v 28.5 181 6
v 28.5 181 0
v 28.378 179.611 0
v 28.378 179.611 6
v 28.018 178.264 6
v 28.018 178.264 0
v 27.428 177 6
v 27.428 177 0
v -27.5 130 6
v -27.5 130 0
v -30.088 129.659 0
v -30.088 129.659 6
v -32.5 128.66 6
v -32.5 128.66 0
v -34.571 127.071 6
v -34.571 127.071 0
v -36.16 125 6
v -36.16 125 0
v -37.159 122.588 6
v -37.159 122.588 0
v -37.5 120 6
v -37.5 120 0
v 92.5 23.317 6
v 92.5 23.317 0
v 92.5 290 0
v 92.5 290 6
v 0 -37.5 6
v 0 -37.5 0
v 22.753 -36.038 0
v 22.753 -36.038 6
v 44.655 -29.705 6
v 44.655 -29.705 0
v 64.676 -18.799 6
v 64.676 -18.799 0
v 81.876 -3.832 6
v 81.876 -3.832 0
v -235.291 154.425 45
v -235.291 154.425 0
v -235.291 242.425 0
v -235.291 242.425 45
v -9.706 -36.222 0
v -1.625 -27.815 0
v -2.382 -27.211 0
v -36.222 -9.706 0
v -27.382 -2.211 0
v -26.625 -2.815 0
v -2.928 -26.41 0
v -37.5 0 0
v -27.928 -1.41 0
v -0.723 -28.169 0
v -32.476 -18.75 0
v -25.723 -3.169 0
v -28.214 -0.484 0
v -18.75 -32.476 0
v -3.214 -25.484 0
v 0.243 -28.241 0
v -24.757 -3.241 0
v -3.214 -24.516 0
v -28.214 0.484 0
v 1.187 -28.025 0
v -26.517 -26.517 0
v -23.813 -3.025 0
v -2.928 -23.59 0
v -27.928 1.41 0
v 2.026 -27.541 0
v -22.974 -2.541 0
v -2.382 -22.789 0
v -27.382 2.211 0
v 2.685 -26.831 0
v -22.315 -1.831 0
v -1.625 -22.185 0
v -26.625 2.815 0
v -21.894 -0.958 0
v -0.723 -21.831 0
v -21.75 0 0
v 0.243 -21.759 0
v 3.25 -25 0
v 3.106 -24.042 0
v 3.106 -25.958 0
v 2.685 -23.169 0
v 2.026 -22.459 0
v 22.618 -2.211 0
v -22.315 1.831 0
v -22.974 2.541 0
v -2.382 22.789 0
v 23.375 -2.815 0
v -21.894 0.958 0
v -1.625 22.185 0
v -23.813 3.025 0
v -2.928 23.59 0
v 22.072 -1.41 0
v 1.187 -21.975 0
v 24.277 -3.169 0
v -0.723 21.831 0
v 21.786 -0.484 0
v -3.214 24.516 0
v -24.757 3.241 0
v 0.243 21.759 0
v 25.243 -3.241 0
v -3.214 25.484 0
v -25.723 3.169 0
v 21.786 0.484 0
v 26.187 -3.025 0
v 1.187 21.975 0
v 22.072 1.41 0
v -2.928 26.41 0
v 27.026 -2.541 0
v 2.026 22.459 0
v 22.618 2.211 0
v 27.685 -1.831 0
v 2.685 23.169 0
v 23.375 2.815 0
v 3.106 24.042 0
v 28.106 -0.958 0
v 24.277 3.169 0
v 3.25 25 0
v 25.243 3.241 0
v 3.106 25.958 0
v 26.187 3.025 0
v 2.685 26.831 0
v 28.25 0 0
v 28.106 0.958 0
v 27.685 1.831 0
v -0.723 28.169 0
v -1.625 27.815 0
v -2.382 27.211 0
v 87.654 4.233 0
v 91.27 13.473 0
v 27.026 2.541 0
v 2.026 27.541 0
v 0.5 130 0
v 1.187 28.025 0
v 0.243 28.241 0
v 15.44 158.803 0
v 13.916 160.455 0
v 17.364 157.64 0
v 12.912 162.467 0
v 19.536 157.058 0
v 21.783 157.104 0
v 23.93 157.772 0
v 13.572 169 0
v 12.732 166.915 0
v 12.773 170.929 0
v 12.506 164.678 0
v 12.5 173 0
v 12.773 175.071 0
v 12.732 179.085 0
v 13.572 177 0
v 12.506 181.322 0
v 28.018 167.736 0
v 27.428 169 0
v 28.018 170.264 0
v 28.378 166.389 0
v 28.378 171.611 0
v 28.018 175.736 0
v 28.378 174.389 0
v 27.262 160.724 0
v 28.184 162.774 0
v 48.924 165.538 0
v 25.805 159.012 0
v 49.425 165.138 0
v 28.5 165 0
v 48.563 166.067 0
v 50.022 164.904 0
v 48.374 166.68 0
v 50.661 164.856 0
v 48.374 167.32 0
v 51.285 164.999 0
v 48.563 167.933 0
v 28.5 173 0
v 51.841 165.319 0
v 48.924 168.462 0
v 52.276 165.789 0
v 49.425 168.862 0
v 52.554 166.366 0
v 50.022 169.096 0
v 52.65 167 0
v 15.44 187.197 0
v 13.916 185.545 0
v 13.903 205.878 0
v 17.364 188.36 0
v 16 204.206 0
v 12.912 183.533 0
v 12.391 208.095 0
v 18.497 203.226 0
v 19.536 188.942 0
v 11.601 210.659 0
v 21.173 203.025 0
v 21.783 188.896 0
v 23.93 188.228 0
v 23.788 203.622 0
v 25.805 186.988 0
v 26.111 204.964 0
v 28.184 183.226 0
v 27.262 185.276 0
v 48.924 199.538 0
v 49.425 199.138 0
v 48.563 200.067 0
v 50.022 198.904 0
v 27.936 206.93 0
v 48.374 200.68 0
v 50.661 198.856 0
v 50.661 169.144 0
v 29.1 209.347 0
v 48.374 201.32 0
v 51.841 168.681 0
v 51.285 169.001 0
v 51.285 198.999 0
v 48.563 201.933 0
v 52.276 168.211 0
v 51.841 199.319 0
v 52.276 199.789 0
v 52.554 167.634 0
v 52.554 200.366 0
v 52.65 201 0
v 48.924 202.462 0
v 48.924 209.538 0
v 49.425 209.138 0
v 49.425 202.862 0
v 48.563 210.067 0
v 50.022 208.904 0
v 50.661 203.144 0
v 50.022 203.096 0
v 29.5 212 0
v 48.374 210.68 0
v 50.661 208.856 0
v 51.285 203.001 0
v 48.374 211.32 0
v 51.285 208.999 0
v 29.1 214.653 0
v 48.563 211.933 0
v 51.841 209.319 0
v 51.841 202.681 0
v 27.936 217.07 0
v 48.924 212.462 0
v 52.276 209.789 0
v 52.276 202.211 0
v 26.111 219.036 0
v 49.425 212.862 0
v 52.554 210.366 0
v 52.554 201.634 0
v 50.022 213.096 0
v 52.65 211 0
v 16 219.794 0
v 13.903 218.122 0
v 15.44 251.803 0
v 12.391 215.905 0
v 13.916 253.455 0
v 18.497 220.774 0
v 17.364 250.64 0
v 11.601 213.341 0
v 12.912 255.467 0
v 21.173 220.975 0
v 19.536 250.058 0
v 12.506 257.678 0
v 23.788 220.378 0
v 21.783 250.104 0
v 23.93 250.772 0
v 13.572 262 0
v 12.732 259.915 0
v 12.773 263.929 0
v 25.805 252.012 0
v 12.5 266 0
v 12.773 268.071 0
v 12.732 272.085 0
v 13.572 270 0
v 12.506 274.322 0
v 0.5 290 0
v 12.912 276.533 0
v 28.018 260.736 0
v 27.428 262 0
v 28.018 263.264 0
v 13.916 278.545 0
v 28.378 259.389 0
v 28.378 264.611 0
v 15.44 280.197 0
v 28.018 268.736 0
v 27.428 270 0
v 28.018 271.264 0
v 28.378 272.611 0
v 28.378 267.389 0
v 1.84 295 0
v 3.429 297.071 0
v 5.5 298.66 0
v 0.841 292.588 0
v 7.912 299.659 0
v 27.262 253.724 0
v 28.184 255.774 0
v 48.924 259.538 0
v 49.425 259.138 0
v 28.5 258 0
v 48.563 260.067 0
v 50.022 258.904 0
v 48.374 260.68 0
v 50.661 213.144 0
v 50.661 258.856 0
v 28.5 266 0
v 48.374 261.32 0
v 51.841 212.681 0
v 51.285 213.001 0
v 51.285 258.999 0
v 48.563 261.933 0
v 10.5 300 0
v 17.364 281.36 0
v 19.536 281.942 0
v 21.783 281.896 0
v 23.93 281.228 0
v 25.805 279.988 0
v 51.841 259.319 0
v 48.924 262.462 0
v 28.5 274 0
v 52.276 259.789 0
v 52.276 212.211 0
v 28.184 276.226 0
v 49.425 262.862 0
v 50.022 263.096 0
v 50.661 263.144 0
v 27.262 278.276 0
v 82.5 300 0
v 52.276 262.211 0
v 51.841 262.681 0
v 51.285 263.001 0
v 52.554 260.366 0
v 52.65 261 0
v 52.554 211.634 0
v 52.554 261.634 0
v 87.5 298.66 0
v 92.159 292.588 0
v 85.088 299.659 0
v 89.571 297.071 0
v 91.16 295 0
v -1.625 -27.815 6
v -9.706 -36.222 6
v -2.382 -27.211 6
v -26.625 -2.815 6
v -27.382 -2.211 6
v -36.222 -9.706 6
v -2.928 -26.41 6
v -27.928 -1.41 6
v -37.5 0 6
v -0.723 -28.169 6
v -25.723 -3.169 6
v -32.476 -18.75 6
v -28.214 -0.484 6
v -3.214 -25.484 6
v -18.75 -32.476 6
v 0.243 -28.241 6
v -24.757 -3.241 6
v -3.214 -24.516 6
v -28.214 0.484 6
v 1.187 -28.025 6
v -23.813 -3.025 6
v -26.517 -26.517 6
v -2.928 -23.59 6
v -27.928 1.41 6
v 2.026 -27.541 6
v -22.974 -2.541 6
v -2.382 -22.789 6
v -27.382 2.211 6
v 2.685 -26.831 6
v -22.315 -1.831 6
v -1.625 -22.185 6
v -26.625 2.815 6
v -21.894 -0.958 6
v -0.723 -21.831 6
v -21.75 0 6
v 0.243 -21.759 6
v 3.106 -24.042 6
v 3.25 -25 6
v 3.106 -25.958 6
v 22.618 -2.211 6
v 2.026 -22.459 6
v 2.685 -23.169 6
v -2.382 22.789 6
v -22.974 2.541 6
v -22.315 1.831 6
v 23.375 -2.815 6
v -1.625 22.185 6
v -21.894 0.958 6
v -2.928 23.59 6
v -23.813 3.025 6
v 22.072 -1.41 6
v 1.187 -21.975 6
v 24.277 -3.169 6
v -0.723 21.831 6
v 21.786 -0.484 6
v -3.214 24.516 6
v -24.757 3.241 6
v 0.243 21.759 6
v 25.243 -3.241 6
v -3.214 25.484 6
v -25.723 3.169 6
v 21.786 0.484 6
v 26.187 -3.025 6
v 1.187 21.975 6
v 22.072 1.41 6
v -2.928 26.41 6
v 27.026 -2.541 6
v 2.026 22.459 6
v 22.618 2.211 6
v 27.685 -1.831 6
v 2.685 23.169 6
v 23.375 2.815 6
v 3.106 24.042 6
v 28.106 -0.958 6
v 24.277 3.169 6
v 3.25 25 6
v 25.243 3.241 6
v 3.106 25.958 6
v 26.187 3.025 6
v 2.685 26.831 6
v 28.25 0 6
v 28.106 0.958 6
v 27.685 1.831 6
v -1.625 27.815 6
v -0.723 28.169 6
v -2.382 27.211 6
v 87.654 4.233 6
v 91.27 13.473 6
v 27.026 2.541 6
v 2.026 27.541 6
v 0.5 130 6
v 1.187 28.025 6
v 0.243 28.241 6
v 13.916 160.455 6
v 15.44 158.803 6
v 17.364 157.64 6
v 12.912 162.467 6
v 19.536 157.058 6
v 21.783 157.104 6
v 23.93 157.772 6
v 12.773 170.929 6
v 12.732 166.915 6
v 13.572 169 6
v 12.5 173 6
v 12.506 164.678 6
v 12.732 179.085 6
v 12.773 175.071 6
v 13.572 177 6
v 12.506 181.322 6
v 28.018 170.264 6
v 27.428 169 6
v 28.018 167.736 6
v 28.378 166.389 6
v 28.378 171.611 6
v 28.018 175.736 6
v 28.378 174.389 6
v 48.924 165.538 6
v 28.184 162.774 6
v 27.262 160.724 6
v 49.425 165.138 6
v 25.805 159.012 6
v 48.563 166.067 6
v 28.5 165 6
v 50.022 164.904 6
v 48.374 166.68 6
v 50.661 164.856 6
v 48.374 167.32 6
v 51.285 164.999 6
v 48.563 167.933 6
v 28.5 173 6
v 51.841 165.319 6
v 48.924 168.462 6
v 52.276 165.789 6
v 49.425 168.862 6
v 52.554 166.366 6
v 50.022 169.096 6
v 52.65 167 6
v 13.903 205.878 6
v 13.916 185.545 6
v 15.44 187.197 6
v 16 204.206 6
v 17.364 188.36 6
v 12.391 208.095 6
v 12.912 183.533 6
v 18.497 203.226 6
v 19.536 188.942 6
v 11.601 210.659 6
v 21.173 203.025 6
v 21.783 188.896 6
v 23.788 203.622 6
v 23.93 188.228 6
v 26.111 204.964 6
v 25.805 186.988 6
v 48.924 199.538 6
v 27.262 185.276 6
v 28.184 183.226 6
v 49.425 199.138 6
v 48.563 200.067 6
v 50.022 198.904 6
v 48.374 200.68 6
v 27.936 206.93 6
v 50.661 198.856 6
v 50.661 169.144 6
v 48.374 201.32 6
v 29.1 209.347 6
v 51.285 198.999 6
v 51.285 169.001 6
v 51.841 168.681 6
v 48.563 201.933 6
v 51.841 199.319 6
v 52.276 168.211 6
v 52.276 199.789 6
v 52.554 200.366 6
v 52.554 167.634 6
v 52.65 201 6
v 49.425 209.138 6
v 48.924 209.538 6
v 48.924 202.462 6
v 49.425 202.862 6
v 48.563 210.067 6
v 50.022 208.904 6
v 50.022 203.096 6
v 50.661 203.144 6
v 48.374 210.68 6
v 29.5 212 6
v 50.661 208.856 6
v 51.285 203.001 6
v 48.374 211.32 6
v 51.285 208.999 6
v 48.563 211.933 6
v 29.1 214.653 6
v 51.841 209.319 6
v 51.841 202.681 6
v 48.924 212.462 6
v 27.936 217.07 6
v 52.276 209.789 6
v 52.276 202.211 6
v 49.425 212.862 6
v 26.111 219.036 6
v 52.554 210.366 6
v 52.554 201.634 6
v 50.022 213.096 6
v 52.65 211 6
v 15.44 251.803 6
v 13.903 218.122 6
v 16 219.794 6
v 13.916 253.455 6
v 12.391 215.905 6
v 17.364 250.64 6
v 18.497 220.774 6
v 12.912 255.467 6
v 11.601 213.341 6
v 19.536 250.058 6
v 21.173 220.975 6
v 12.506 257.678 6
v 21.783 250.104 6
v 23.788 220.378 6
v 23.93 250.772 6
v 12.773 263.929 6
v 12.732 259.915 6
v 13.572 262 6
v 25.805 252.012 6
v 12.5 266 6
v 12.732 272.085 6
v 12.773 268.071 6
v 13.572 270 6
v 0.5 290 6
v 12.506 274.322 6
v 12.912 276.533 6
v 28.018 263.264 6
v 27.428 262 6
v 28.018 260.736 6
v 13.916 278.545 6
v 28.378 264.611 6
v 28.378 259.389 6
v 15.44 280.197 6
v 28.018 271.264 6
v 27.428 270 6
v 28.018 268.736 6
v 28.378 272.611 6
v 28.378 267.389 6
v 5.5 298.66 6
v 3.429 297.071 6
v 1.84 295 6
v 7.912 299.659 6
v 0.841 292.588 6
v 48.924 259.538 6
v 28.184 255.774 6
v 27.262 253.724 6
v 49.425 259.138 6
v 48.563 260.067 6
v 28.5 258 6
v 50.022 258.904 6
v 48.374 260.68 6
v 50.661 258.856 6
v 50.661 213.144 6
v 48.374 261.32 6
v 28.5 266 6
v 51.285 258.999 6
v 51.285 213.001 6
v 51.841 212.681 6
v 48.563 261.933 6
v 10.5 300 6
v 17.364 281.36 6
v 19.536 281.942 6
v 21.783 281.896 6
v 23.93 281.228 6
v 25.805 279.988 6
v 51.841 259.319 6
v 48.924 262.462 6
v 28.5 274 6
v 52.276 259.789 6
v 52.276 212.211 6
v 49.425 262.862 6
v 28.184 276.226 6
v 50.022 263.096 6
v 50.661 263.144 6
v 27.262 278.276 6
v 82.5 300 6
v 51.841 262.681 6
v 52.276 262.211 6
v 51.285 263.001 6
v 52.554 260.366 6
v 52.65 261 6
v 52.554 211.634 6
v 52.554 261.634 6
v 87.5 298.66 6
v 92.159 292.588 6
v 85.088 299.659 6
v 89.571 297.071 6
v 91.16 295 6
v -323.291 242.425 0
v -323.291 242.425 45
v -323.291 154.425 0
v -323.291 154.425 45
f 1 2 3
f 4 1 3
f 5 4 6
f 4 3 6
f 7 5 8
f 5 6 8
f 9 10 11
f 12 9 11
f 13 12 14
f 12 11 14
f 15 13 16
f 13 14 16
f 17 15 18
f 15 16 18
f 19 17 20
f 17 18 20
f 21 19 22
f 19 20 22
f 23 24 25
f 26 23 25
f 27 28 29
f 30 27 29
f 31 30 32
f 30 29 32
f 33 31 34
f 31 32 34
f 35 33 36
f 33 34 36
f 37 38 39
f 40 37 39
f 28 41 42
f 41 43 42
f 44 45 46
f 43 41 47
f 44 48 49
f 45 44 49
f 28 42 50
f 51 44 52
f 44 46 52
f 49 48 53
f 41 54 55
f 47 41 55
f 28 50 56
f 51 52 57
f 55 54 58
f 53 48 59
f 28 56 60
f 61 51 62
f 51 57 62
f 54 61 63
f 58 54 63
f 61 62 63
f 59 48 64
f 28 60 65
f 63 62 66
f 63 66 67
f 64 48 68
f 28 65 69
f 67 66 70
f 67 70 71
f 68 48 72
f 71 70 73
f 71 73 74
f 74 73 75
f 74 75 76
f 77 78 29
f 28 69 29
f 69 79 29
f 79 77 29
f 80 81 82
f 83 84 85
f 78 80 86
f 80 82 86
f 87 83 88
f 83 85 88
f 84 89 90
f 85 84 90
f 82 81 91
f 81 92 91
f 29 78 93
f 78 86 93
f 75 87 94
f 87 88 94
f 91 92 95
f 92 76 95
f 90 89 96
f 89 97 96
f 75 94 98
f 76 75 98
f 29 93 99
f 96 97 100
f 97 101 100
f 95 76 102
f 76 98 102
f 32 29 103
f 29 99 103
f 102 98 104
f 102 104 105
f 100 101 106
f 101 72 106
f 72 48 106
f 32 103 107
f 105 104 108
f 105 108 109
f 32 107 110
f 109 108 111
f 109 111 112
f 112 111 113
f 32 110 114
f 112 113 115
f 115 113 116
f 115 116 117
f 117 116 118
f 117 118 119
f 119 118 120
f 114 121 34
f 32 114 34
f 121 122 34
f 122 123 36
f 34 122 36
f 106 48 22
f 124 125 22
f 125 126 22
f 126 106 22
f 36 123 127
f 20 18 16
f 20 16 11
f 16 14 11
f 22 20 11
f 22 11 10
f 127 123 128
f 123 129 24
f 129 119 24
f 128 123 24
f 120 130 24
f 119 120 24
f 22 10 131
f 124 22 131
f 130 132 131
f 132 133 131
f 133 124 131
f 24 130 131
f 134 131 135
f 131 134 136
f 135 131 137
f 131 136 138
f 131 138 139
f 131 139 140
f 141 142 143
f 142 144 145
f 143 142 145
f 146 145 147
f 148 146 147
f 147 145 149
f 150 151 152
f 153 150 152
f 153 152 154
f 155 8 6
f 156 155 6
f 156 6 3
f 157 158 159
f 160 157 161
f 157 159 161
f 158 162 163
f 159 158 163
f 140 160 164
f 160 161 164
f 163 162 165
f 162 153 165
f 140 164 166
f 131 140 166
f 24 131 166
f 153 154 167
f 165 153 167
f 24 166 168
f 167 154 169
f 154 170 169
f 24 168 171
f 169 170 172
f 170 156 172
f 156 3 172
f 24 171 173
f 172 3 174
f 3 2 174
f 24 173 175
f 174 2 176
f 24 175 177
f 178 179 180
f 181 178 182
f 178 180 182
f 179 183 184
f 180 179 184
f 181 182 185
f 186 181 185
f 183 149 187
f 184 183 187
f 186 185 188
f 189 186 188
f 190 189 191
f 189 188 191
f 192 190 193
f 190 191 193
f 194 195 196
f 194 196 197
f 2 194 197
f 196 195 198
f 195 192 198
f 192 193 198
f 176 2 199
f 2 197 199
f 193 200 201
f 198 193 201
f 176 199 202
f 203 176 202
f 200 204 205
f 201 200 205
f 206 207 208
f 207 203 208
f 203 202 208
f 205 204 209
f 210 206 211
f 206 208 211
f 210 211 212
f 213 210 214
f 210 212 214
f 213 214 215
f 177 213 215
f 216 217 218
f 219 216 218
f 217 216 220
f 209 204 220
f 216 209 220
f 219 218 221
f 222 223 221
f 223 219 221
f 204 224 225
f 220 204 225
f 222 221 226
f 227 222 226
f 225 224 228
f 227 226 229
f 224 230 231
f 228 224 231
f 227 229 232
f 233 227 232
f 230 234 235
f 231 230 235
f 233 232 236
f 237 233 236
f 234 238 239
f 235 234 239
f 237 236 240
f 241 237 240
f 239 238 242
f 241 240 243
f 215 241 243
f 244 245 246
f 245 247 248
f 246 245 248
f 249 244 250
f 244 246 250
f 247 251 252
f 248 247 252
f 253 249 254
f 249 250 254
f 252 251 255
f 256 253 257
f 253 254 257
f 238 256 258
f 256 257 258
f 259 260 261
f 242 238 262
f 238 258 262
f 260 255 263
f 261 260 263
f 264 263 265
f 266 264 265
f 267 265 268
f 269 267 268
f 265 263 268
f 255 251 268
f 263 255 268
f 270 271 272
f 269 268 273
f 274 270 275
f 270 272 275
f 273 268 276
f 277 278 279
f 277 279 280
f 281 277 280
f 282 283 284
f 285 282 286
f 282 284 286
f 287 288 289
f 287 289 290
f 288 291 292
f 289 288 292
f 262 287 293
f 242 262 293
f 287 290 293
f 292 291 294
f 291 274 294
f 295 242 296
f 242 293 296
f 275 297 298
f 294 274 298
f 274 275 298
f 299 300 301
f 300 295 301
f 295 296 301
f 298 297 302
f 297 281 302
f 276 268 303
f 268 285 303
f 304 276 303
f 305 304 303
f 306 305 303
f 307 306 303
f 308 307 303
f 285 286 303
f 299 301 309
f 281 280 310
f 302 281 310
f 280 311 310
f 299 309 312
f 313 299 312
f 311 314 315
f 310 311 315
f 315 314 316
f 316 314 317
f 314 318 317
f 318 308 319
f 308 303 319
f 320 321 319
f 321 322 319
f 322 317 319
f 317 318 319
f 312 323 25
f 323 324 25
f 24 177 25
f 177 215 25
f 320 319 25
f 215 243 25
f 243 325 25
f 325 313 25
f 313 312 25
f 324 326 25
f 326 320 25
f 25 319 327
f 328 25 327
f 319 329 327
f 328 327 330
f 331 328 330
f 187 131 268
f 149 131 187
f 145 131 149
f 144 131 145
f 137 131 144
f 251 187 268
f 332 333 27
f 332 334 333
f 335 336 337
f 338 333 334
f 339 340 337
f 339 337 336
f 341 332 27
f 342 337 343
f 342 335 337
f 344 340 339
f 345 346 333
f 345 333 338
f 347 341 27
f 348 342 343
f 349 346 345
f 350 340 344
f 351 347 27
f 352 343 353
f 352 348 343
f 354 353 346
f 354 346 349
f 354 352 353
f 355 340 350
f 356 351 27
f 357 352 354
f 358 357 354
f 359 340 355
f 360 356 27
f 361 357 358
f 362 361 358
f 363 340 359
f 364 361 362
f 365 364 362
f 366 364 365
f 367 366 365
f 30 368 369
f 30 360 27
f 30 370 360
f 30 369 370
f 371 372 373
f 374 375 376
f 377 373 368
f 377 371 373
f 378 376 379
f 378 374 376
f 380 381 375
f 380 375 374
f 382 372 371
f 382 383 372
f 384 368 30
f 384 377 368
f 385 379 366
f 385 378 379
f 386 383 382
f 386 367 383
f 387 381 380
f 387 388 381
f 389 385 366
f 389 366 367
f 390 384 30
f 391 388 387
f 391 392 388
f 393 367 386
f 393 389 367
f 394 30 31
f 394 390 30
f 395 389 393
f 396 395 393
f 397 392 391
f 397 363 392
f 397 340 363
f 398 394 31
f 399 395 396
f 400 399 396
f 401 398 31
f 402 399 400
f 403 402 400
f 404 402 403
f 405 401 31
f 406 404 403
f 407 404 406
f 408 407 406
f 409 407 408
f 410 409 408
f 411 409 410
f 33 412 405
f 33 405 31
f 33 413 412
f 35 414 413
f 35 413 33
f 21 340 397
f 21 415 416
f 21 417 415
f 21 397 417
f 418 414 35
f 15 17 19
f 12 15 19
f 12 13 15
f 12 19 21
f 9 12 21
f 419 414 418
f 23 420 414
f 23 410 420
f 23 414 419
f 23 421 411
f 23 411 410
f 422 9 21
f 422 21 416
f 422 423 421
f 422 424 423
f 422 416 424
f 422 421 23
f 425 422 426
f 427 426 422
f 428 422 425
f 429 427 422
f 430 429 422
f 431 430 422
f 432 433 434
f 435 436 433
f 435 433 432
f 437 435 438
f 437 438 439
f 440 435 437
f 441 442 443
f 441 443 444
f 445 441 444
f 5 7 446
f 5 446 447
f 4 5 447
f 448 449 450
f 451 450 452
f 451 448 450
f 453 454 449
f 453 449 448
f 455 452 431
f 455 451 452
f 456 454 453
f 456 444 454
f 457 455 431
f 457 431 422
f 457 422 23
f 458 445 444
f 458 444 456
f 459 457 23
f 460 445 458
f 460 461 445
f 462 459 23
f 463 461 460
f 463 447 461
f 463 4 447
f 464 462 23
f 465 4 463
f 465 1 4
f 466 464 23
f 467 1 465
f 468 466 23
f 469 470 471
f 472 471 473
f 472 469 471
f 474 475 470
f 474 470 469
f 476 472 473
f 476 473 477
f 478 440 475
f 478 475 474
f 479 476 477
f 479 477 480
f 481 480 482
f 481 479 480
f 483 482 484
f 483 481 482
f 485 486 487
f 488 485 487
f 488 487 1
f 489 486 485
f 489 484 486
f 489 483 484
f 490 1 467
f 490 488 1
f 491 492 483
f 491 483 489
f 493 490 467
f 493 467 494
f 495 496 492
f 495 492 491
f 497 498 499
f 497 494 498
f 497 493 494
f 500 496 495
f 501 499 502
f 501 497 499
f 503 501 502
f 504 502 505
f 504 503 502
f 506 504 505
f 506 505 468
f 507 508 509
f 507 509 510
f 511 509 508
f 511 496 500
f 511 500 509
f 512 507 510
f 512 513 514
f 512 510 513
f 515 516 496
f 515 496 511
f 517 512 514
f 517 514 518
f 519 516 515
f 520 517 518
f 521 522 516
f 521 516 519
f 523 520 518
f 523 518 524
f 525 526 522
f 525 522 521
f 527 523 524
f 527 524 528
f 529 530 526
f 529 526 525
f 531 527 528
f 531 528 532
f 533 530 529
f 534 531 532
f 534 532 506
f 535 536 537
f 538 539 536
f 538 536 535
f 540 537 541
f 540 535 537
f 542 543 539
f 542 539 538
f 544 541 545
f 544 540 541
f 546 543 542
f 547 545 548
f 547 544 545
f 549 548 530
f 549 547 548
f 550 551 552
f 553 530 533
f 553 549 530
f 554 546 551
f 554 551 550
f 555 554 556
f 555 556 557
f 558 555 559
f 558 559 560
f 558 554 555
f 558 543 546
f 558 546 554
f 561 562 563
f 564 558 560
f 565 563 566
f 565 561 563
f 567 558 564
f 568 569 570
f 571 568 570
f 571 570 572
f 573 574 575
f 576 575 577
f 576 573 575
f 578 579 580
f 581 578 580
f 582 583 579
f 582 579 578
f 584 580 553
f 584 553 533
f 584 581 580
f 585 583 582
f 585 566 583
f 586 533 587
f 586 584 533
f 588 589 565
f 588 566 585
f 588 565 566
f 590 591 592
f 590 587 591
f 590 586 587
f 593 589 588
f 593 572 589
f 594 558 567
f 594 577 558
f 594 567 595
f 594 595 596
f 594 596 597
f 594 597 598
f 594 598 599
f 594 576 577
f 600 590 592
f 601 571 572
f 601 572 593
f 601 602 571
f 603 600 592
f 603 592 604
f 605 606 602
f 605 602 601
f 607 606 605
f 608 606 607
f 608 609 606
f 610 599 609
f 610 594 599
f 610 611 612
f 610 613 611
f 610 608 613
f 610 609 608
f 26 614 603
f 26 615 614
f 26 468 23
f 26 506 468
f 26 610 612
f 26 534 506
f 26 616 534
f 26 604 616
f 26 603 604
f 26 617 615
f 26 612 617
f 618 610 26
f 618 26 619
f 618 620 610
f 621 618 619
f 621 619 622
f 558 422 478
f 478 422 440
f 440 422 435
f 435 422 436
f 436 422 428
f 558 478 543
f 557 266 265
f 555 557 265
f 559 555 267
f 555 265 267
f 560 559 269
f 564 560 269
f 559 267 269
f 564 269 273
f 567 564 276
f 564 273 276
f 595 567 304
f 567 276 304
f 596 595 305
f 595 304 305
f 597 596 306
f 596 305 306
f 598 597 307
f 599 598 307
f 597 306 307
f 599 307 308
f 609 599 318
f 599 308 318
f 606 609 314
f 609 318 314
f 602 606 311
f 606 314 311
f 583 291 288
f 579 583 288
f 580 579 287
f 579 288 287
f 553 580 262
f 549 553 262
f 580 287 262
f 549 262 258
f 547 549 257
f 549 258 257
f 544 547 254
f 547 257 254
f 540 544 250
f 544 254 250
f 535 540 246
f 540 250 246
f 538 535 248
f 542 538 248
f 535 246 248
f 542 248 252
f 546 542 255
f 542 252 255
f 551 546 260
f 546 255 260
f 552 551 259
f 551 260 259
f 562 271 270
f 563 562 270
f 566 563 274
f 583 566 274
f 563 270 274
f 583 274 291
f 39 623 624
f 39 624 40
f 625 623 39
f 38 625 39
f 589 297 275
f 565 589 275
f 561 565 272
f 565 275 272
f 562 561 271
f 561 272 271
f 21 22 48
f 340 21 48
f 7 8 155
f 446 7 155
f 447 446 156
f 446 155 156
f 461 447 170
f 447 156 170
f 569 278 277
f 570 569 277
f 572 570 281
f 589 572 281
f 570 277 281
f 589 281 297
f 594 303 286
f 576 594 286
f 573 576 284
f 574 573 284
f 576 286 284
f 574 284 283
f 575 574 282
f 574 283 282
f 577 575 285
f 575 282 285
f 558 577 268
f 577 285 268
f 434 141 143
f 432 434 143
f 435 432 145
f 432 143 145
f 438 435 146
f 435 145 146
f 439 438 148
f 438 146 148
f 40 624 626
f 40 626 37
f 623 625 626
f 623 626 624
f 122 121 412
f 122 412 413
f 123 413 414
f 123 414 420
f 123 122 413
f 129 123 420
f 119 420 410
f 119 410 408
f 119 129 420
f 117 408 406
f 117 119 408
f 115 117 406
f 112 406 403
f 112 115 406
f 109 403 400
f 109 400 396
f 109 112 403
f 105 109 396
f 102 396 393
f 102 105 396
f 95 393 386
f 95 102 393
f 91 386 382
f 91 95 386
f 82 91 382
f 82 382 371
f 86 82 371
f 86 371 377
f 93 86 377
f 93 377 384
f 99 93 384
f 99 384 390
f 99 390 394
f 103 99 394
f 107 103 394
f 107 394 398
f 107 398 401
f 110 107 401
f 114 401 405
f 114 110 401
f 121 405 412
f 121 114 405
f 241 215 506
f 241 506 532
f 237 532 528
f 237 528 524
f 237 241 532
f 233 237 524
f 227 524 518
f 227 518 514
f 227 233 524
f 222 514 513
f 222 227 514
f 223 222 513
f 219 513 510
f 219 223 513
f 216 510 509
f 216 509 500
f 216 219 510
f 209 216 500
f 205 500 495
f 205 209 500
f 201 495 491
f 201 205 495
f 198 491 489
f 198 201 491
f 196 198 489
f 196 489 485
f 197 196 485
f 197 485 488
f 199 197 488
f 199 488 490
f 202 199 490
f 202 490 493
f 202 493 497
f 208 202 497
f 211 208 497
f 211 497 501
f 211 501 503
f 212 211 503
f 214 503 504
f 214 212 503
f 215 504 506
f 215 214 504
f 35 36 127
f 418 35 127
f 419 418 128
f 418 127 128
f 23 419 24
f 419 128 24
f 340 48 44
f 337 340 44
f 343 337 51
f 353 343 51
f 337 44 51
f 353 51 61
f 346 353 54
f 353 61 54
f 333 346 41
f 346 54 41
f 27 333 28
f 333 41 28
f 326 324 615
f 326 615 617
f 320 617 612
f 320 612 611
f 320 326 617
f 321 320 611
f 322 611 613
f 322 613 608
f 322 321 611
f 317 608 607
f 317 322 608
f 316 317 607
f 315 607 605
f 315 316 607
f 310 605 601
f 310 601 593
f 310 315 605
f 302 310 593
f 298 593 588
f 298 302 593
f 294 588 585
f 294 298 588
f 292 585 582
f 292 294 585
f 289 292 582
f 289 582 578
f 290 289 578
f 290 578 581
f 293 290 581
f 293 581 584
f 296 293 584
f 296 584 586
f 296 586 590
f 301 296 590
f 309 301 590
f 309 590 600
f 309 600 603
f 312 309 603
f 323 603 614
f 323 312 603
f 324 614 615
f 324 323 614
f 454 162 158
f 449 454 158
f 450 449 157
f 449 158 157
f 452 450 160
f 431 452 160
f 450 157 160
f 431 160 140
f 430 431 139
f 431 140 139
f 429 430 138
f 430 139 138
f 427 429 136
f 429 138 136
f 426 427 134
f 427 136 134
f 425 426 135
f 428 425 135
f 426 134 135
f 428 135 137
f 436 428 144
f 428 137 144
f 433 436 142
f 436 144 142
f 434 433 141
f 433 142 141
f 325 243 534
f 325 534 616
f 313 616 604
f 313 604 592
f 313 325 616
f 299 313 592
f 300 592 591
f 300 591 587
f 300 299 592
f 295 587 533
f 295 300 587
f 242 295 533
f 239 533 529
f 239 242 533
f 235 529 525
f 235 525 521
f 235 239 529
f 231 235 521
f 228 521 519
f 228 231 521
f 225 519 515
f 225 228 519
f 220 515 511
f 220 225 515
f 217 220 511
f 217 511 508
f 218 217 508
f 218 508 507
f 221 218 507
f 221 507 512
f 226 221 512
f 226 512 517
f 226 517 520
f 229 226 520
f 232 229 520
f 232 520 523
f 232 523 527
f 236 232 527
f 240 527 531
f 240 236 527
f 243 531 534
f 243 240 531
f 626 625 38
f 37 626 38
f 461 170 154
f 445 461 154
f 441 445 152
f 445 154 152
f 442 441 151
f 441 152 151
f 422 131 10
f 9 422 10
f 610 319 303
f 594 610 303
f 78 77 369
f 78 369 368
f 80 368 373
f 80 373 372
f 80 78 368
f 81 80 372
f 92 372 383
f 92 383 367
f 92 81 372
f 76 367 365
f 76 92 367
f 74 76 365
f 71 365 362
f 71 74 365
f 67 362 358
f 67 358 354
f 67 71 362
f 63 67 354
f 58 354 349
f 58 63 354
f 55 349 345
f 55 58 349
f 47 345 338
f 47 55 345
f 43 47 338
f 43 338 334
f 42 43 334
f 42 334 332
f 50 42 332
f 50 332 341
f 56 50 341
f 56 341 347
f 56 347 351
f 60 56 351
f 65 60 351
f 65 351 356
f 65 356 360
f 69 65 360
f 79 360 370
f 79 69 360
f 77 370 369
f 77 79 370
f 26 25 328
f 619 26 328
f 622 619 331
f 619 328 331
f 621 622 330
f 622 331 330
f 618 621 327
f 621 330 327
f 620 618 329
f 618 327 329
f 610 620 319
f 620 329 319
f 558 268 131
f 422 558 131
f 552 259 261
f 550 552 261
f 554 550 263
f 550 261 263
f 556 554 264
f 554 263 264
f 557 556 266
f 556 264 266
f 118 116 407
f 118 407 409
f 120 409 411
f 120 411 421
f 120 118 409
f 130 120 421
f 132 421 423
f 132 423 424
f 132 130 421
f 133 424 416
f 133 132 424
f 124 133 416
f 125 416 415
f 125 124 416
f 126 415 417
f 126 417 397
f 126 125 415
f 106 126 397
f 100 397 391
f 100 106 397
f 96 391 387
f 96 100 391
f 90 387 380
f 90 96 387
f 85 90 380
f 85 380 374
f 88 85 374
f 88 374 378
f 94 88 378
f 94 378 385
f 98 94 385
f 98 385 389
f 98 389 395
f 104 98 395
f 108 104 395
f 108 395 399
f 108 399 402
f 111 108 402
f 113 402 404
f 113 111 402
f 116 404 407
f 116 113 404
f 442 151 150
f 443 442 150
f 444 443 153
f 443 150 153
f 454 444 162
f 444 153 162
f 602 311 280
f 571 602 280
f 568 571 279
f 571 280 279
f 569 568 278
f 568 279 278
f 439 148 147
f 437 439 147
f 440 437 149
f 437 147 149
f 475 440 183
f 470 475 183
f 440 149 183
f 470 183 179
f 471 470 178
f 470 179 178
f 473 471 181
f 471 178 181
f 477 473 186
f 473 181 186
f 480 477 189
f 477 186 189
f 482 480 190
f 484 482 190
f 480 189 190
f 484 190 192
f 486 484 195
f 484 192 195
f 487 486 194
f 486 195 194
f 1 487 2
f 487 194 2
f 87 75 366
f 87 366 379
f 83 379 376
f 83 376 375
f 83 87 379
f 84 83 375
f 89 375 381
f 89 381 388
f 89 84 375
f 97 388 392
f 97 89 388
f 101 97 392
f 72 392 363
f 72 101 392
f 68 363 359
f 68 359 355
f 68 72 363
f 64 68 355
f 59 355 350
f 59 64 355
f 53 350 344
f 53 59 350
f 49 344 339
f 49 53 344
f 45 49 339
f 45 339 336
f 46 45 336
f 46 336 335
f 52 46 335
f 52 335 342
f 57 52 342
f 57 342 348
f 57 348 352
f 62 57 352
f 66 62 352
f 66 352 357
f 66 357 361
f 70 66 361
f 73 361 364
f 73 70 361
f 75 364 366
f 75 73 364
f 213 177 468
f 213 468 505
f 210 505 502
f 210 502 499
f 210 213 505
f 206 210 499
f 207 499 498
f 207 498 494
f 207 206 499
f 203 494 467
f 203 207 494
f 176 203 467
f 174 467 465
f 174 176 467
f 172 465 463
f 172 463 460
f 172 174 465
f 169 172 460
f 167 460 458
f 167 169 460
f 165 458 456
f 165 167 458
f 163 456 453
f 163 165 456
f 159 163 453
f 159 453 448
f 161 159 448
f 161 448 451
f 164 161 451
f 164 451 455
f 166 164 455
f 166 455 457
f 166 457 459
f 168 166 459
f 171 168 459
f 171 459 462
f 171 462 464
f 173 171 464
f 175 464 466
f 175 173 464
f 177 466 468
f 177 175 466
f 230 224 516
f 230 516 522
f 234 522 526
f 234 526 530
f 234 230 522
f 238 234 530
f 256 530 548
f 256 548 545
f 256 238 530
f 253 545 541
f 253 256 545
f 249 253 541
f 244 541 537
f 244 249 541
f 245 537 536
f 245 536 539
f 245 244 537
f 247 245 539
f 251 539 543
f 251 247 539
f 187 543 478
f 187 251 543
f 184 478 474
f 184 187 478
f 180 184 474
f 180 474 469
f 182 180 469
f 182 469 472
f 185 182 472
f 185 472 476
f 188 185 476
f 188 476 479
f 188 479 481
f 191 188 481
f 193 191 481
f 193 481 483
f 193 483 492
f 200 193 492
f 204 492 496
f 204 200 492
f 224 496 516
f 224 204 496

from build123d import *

# Parameters (mm, degrees)
F0_R     = 3.25
F0_R_2   = 2.15
F0_R_3   = 9
F1_DEPTH = 6
F0_W     = 88
F0_H     = 88
F2_DEPTH = 45


# Not quite as in the source:
# - a feature names something its author has since deleted; it is built from what else it names


with BuildPart() as f1:
    # F0 (on Top) → F1 (new body)
    with BuildSketch(Plane.XY):
        with BuildLine():
            Line((-37.5, 29.9842730165), (-37.5, 0))
            ThreePointArc((-37.5, 0), (-26.5165042945, -26.5165042945), (0, -37.5))
            ThreePointArc((0, -37.5), (44.6548482199, -29.7050919513), (81.8756191651, -3.8317413512))
            ThreePointArc((81.8756191651, -3.8317413512), (89.7493272866, 8.7403920196), (92.5, 23.3173470068))
            Line((92.5, 23.3173470068), (92.5, 75.5242775083))
            Line((92.5, 75.5242775083), (92.5, 130))
            Line((92.5, 130), (92.5, 276))
            Line((92.5, 276), (92.5, 286.8150174618))
            Line((92.5, 286.8150174618), (92.5, 290))
            ThreePointArc((92.5, 290), (89.5710678119, 297.0710678119), (82.5, 300))
            Line((82.5, 300), (10.5, 300))
            ThreePointArc((10.5, 300), (3.4289321881, 297.0710678119), (0.5, 290))
            Line((0.5, 290), (0.5, 160))
            Line((0.5, 160), (0.5, 143.811336026))
            Line((0.5, 143.811336026), (0.5, 130))
            Line((0.5, 130), (-27.5, 130))
            ThreePointArc((-27.5, 130), (-34.5710678119, 127.0710678119), (-37.5, 120))
            Line((-37.5, 120), (-37.5, 29.9842730165))
        make_face()
        with Locations((-25, 0)):
            Circle(F0_R, mode=Mode.SUBTRACT)
        with Locations((0, -25)):
            Circle(F0_R, mode=Mode.SUBTRACT)
        with Locations((25, 0)):
            Circle(F0_R, mode=Mode.SUBTRACT)
        with Locations((0, 25)):
            Circle(F0_R, mode=Mode.SUBTRACT)
        with BuildLine():
            ThreePointArc((27.4282032303, 169), (28.2274066103, 167.0705523608), (28.5, 165))
            ThreePointArc((28.5, 165), (18.4294476392, 157.2725933897), (13.5717967697, 169))
            ThreePointArc((13.5717967697, 169), (12.5, 173), (13.5717967697, 177))
            ThreePointArc((13.5717967697, 177), (18.4294476392, 188.7274066103), (28.5, 181))
            ThreePointArc((28.5, 181), (28.2274066103, 178.9294476392), (27.4282032303, 177))
            ThreePointArc((27.4282032303, 177), (28.2274066103, 175.0705523608), (28.5, 173))
            ThreePointArc((28.5, 173), (28.2274066103, 170.9294476392), (27.4282032303, 169))
        make_face(mode=Mode.SUBTRACT)
        with Locations((50.5, 167)):
            Circle(F0_R_2, mode=Mode.SUBTRACT)
        with Locations((20.5, 212)):
            Circle(F0_R_3, mode=Mode.SUBTRACT)
        with Locations((50.5, 201)):
            Circle(F0_R_2, mode=Mode.SUBTRACT)
        with Locations((50.5, 211)):
            Circle(F0_R_2, mode=Mode.SUBTRACT)
        with BuildLine():
            ThreePointArc((27.4282032303, 262), (28.2274066103, 260.0705523608), (28.5, 258))
            ThreePointArc((28.5, 258), (18.4294476392, 250.2725933897), (13.5717967697, 262))
            ThreePointArc((13.5717967697, 262), (12.5, 266), (13.5717967697, 270))
            ThreePointArc((13.5717967697, 270), (18.4294476392, 281.7274066103), (28.5, 274))
            ThreePointArc((28.5, 274), (28.2274066103, 271.9294476392), (27.4282032303, 270))
            ThreePointArc((27.4282032303, 270), (28.2274066103, 268.0705523608), (28.5, 266))
            ThreePointArc((28.5, 266), (28.2274066103, 263.9294476392), (27.4282032303, 262))
        make_face(mode=Mode.SUBTRACT)
        with Locations((50.5, 261)):
            Circle(F0_R_2, mode=Mode.SUBTRACT)
    extrude(amount=F1_DEPTH)


with BuildPart() as f2:
    # F0 (on Top) → F2 (new body)
    with BuildSketch(Plane.XY):
        with Locations((-279.2910335064, 198.4254124165)):
            Rectangle(F0_W, F0_H)
    extrude(amount=F2_DEPTH)


solid = Compound([f1.part, f2.part])
